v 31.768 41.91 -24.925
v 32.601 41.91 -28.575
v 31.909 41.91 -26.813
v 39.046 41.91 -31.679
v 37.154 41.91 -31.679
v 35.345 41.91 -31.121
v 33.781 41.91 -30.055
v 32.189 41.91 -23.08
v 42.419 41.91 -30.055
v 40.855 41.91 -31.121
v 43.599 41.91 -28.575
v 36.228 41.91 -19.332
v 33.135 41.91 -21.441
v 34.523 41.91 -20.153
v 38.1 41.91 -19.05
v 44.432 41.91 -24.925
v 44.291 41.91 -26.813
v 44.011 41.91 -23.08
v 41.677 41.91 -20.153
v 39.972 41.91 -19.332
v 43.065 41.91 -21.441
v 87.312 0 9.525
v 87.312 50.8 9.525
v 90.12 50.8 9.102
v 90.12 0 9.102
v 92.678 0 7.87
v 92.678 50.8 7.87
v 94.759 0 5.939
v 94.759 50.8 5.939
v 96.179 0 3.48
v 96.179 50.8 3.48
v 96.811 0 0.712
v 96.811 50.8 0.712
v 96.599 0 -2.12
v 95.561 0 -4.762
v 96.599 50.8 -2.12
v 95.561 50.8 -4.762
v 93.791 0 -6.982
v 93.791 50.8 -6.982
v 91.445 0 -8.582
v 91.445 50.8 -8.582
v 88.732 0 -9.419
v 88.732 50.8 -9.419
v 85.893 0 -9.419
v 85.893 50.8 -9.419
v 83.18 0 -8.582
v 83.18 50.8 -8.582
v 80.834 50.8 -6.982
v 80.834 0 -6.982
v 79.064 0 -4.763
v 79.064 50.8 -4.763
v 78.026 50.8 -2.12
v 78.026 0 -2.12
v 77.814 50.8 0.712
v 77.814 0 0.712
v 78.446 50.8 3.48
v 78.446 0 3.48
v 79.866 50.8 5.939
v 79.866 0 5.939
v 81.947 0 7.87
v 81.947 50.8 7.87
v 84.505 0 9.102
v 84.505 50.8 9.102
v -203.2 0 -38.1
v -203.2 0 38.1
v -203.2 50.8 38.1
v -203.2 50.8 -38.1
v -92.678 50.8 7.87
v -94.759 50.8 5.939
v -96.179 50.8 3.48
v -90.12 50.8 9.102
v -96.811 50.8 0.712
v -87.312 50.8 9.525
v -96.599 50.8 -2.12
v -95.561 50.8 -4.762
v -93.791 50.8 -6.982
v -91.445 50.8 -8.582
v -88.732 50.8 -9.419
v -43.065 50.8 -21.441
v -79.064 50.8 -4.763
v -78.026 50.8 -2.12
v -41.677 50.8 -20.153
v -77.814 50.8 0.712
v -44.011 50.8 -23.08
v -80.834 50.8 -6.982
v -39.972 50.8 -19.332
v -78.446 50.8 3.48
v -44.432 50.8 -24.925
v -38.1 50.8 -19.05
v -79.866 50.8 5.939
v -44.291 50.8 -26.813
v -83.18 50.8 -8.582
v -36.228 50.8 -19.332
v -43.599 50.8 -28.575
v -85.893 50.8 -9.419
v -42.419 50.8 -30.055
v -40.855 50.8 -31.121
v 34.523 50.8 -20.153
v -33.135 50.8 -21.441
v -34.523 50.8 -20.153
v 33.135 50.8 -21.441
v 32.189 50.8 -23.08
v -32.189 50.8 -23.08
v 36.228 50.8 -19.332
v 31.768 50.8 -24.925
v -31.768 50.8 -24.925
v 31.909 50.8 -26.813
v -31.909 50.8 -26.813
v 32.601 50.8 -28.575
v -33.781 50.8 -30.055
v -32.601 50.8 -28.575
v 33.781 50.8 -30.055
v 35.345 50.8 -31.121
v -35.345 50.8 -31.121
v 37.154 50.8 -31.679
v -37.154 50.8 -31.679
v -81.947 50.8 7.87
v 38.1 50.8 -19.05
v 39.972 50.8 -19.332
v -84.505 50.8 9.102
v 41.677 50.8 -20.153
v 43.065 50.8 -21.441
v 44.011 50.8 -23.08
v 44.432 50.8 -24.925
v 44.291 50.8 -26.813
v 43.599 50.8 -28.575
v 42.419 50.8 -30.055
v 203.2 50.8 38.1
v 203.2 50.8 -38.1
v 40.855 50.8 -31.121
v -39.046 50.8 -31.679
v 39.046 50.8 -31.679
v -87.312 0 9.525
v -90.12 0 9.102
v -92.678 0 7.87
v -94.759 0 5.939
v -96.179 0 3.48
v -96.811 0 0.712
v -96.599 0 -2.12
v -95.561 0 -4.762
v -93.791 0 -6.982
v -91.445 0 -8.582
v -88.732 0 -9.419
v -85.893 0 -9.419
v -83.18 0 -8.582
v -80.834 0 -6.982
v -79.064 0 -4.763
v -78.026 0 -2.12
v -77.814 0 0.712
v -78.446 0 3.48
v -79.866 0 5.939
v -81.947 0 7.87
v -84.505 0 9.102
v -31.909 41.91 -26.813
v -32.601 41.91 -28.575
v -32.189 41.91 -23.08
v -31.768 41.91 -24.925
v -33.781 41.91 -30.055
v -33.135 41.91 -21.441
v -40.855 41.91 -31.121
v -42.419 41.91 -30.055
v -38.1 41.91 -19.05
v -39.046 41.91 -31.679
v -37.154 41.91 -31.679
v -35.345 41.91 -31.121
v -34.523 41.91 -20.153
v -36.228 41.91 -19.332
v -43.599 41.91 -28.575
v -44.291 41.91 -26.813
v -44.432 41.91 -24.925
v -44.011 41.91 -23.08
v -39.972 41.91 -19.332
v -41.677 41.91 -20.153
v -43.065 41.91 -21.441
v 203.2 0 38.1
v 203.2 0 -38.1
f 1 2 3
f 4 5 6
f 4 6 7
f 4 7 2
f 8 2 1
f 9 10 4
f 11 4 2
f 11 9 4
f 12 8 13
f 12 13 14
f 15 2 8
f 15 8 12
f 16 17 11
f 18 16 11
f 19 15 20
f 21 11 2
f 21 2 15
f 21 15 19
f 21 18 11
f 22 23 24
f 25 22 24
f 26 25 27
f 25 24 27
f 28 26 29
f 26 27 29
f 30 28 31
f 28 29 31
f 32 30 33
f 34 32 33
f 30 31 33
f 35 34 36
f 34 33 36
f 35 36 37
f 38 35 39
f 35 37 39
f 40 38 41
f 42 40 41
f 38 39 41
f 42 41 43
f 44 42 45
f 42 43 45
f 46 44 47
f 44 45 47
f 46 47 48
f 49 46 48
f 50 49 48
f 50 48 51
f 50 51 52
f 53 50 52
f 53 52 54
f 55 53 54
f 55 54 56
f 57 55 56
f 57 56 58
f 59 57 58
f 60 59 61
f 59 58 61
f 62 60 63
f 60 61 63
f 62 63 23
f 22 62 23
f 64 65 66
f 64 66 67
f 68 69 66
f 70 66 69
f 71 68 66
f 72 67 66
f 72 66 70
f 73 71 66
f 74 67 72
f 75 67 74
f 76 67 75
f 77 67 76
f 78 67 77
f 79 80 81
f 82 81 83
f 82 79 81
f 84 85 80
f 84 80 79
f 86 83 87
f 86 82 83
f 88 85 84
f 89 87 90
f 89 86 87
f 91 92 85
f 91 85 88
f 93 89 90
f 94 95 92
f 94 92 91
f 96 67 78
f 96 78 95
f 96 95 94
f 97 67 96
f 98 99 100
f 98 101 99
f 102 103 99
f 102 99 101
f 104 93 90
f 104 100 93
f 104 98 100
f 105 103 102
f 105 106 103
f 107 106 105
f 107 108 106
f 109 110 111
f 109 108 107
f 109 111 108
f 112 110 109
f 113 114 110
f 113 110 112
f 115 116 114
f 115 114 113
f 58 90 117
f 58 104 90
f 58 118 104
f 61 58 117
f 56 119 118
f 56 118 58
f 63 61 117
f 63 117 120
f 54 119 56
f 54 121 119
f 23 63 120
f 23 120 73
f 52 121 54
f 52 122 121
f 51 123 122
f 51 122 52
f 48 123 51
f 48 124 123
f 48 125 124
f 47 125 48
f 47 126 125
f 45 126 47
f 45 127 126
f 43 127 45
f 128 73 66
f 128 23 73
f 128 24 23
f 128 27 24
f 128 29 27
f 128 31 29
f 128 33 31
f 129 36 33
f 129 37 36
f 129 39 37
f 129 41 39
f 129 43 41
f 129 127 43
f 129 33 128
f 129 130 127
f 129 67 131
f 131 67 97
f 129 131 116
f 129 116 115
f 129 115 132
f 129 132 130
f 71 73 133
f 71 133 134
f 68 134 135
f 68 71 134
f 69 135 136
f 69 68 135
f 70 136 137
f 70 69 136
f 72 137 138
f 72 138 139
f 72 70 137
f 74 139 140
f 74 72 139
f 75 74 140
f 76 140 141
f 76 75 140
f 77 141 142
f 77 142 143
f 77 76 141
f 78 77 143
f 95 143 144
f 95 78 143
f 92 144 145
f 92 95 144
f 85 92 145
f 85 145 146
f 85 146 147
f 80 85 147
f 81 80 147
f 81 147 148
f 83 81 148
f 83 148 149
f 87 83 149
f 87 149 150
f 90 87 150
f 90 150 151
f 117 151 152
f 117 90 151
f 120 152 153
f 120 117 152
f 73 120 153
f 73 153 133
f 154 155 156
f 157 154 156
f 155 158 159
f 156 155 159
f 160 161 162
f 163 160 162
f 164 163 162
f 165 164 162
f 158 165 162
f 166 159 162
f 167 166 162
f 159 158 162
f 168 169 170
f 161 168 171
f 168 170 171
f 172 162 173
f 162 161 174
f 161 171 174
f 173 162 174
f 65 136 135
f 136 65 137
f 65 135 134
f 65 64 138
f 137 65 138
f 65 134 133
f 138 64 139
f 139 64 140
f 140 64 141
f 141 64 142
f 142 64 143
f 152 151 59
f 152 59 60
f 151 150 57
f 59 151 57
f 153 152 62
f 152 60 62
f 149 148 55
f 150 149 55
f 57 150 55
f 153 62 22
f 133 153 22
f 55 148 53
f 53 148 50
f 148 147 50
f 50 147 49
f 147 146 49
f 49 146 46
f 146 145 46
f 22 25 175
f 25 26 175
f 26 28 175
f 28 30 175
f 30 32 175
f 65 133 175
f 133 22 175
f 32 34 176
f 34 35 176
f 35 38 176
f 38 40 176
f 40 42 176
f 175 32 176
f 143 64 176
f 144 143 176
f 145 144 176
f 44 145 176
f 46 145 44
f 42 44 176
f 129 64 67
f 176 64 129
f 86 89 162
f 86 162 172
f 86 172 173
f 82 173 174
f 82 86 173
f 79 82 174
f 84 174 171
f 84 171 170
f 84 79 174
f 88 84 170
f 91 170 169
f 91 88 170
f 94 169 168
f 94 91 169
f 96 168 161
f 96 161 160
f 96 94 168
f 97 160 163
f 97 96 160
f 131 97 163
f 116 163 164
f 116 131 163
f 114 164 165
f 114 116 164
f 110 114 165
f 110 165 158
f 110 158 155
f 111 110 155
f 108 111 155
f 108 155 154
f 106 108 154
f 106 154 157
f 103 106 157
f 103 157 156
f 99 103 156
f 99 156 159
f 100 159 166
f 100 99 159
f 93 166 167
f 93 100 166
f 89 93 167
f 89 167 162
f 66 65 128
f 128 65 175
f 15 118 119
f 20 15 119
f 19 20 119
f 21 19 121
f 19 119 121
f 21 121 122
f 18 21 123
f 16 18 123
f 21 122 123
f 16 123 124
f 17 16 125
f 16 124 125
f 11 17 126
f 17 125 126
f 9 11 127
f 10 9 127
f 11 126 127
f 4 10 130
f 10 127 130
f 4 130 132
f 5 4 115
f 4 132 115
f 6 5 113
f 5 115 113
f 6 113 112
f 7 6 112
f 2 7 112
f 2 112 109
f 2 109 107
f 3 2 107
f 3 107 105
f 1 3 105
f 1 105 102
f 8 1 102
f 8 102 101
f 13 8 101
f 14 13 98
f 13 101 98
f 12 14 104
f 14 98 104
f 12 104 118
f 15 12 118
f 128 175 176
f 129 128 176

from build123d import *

# Parameters (mm, degrees)
SKETCH1_W           = 406.4
SKETCH1_H           = 76.2
BOSS_EXTRUDE1_DEPTH = 50.8
SKETCH3_R           = 9.525
CUT_EXTRUDE1_DEPTH  = 50.8
SKETCH4_R           = 6.35
CUT_EXTRUDE2_DEPTH  = 8.89


with BuildPart() as part:
    # Sketch1 → Boss-Extrude1 (new body)
    with BuildSketch(Plane(origin=(0, 0, 0), x_dir=(1, 0, 0), z_dir=(0, 1, 0))):
        Rectangle(SKETCH1_W, SKETCH1_H)
    extrude(amount=BOSS_EXTRUDE1_DEPTH)

    # Sketch3 → Cut-Extrude1 (cut)
    with BuildSketch(Plane(origin=(0, 50.8, 0), x_dir=(1, 0, 0), z_dir=(0, 1, 0))):
        with Locations(Location((87.3125, 0, 0), (0, 0, 270))):
            Circle(SKETCH3_R)
    cut_extrude1 = extrude(amount=-CUT_EXTRUDE1_DEPTH, mode=Mode.SUBTRACT)

    # Sketch4 → Cut-Extrude2 (cut)
    with BuildSketch(Plane(origin=(0, 50.8, 0), x_dir=(1, 0, 0), z_dir=(0, 1, 0))):
        with Locations(Location((38.1, 25.4, 0), (0, 0, 270))):
            Circle(SKETCH4_R)
    cut_extrude2 = extrude(amount=-CUT_EXTRUDE2_DEPTH, mode=Mode.SUBTRACT)

    # Mirror1: Cut-Extrude1, Cut-Extrude2 across plane
    add(cut_extrude1.mirror(Plane(origin=(0, 0, 0), x_dir=(0, 0, 1), z_dir=(1, 0, 0))), mode=Mode.SUBTRACT)
    add(cut_extrude2.mirror(Plane(origin=(0, 0, 0), x_dir=(0, 0, 1), z_dir=(1, 0, 0))), mode=Mode.SUBTRACT)


solid = part.part
